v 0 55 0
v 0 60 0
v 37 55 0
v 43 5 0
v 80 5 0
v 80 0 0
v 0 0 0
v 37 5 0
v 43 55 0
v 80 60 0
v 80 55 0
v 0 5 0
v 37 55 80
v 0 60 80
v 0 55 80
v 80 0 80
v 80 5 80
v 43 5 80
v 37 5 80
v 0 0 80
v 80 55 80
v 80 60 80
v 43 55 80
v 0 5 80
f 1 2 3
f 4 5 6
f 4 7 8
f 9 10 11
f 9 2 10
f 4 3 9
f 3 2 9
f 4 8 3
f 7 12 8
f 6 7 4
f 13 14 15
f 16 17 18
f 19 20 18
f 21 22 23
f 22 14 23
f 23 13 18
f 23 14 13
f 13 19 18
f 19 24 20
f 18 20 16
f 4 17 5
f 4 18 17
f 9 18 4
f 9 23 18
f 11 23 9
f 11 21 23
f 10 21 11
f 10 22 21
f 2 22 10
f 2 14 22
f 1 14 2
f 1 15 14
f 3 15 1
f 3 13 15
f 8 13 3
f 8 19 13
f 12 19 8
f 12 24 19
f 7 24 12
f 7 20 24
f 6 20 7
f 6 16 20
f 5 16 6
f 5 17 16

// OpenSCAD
$fn = 32;

// ----------------------------------------------------------------------
// Structural section: ibeam 80 x 60 mm
// ----------------------------------------------------------------------

// --- parameters (mm) ---
sec_w = 80;               // section width, X
sec_h = 60;               // section height, Y
flange_t = 5;             // flange thickness
web_t = 6;                // web thickness
plate_t = 80;             // cut length, Z (extrusion height)

profile = [[0, 0], [80, 0], [80, 5], [43, 5], [43, 55], [80, 55], [80, 60], [0, 60], [0, 55], [37, 55], [37, 5], [0, 5]];  // primary outline, 12 points, counter clockwise

// --- the one profile operation ---
linear_extrude(height = plate_t) polygon(points = profile);
